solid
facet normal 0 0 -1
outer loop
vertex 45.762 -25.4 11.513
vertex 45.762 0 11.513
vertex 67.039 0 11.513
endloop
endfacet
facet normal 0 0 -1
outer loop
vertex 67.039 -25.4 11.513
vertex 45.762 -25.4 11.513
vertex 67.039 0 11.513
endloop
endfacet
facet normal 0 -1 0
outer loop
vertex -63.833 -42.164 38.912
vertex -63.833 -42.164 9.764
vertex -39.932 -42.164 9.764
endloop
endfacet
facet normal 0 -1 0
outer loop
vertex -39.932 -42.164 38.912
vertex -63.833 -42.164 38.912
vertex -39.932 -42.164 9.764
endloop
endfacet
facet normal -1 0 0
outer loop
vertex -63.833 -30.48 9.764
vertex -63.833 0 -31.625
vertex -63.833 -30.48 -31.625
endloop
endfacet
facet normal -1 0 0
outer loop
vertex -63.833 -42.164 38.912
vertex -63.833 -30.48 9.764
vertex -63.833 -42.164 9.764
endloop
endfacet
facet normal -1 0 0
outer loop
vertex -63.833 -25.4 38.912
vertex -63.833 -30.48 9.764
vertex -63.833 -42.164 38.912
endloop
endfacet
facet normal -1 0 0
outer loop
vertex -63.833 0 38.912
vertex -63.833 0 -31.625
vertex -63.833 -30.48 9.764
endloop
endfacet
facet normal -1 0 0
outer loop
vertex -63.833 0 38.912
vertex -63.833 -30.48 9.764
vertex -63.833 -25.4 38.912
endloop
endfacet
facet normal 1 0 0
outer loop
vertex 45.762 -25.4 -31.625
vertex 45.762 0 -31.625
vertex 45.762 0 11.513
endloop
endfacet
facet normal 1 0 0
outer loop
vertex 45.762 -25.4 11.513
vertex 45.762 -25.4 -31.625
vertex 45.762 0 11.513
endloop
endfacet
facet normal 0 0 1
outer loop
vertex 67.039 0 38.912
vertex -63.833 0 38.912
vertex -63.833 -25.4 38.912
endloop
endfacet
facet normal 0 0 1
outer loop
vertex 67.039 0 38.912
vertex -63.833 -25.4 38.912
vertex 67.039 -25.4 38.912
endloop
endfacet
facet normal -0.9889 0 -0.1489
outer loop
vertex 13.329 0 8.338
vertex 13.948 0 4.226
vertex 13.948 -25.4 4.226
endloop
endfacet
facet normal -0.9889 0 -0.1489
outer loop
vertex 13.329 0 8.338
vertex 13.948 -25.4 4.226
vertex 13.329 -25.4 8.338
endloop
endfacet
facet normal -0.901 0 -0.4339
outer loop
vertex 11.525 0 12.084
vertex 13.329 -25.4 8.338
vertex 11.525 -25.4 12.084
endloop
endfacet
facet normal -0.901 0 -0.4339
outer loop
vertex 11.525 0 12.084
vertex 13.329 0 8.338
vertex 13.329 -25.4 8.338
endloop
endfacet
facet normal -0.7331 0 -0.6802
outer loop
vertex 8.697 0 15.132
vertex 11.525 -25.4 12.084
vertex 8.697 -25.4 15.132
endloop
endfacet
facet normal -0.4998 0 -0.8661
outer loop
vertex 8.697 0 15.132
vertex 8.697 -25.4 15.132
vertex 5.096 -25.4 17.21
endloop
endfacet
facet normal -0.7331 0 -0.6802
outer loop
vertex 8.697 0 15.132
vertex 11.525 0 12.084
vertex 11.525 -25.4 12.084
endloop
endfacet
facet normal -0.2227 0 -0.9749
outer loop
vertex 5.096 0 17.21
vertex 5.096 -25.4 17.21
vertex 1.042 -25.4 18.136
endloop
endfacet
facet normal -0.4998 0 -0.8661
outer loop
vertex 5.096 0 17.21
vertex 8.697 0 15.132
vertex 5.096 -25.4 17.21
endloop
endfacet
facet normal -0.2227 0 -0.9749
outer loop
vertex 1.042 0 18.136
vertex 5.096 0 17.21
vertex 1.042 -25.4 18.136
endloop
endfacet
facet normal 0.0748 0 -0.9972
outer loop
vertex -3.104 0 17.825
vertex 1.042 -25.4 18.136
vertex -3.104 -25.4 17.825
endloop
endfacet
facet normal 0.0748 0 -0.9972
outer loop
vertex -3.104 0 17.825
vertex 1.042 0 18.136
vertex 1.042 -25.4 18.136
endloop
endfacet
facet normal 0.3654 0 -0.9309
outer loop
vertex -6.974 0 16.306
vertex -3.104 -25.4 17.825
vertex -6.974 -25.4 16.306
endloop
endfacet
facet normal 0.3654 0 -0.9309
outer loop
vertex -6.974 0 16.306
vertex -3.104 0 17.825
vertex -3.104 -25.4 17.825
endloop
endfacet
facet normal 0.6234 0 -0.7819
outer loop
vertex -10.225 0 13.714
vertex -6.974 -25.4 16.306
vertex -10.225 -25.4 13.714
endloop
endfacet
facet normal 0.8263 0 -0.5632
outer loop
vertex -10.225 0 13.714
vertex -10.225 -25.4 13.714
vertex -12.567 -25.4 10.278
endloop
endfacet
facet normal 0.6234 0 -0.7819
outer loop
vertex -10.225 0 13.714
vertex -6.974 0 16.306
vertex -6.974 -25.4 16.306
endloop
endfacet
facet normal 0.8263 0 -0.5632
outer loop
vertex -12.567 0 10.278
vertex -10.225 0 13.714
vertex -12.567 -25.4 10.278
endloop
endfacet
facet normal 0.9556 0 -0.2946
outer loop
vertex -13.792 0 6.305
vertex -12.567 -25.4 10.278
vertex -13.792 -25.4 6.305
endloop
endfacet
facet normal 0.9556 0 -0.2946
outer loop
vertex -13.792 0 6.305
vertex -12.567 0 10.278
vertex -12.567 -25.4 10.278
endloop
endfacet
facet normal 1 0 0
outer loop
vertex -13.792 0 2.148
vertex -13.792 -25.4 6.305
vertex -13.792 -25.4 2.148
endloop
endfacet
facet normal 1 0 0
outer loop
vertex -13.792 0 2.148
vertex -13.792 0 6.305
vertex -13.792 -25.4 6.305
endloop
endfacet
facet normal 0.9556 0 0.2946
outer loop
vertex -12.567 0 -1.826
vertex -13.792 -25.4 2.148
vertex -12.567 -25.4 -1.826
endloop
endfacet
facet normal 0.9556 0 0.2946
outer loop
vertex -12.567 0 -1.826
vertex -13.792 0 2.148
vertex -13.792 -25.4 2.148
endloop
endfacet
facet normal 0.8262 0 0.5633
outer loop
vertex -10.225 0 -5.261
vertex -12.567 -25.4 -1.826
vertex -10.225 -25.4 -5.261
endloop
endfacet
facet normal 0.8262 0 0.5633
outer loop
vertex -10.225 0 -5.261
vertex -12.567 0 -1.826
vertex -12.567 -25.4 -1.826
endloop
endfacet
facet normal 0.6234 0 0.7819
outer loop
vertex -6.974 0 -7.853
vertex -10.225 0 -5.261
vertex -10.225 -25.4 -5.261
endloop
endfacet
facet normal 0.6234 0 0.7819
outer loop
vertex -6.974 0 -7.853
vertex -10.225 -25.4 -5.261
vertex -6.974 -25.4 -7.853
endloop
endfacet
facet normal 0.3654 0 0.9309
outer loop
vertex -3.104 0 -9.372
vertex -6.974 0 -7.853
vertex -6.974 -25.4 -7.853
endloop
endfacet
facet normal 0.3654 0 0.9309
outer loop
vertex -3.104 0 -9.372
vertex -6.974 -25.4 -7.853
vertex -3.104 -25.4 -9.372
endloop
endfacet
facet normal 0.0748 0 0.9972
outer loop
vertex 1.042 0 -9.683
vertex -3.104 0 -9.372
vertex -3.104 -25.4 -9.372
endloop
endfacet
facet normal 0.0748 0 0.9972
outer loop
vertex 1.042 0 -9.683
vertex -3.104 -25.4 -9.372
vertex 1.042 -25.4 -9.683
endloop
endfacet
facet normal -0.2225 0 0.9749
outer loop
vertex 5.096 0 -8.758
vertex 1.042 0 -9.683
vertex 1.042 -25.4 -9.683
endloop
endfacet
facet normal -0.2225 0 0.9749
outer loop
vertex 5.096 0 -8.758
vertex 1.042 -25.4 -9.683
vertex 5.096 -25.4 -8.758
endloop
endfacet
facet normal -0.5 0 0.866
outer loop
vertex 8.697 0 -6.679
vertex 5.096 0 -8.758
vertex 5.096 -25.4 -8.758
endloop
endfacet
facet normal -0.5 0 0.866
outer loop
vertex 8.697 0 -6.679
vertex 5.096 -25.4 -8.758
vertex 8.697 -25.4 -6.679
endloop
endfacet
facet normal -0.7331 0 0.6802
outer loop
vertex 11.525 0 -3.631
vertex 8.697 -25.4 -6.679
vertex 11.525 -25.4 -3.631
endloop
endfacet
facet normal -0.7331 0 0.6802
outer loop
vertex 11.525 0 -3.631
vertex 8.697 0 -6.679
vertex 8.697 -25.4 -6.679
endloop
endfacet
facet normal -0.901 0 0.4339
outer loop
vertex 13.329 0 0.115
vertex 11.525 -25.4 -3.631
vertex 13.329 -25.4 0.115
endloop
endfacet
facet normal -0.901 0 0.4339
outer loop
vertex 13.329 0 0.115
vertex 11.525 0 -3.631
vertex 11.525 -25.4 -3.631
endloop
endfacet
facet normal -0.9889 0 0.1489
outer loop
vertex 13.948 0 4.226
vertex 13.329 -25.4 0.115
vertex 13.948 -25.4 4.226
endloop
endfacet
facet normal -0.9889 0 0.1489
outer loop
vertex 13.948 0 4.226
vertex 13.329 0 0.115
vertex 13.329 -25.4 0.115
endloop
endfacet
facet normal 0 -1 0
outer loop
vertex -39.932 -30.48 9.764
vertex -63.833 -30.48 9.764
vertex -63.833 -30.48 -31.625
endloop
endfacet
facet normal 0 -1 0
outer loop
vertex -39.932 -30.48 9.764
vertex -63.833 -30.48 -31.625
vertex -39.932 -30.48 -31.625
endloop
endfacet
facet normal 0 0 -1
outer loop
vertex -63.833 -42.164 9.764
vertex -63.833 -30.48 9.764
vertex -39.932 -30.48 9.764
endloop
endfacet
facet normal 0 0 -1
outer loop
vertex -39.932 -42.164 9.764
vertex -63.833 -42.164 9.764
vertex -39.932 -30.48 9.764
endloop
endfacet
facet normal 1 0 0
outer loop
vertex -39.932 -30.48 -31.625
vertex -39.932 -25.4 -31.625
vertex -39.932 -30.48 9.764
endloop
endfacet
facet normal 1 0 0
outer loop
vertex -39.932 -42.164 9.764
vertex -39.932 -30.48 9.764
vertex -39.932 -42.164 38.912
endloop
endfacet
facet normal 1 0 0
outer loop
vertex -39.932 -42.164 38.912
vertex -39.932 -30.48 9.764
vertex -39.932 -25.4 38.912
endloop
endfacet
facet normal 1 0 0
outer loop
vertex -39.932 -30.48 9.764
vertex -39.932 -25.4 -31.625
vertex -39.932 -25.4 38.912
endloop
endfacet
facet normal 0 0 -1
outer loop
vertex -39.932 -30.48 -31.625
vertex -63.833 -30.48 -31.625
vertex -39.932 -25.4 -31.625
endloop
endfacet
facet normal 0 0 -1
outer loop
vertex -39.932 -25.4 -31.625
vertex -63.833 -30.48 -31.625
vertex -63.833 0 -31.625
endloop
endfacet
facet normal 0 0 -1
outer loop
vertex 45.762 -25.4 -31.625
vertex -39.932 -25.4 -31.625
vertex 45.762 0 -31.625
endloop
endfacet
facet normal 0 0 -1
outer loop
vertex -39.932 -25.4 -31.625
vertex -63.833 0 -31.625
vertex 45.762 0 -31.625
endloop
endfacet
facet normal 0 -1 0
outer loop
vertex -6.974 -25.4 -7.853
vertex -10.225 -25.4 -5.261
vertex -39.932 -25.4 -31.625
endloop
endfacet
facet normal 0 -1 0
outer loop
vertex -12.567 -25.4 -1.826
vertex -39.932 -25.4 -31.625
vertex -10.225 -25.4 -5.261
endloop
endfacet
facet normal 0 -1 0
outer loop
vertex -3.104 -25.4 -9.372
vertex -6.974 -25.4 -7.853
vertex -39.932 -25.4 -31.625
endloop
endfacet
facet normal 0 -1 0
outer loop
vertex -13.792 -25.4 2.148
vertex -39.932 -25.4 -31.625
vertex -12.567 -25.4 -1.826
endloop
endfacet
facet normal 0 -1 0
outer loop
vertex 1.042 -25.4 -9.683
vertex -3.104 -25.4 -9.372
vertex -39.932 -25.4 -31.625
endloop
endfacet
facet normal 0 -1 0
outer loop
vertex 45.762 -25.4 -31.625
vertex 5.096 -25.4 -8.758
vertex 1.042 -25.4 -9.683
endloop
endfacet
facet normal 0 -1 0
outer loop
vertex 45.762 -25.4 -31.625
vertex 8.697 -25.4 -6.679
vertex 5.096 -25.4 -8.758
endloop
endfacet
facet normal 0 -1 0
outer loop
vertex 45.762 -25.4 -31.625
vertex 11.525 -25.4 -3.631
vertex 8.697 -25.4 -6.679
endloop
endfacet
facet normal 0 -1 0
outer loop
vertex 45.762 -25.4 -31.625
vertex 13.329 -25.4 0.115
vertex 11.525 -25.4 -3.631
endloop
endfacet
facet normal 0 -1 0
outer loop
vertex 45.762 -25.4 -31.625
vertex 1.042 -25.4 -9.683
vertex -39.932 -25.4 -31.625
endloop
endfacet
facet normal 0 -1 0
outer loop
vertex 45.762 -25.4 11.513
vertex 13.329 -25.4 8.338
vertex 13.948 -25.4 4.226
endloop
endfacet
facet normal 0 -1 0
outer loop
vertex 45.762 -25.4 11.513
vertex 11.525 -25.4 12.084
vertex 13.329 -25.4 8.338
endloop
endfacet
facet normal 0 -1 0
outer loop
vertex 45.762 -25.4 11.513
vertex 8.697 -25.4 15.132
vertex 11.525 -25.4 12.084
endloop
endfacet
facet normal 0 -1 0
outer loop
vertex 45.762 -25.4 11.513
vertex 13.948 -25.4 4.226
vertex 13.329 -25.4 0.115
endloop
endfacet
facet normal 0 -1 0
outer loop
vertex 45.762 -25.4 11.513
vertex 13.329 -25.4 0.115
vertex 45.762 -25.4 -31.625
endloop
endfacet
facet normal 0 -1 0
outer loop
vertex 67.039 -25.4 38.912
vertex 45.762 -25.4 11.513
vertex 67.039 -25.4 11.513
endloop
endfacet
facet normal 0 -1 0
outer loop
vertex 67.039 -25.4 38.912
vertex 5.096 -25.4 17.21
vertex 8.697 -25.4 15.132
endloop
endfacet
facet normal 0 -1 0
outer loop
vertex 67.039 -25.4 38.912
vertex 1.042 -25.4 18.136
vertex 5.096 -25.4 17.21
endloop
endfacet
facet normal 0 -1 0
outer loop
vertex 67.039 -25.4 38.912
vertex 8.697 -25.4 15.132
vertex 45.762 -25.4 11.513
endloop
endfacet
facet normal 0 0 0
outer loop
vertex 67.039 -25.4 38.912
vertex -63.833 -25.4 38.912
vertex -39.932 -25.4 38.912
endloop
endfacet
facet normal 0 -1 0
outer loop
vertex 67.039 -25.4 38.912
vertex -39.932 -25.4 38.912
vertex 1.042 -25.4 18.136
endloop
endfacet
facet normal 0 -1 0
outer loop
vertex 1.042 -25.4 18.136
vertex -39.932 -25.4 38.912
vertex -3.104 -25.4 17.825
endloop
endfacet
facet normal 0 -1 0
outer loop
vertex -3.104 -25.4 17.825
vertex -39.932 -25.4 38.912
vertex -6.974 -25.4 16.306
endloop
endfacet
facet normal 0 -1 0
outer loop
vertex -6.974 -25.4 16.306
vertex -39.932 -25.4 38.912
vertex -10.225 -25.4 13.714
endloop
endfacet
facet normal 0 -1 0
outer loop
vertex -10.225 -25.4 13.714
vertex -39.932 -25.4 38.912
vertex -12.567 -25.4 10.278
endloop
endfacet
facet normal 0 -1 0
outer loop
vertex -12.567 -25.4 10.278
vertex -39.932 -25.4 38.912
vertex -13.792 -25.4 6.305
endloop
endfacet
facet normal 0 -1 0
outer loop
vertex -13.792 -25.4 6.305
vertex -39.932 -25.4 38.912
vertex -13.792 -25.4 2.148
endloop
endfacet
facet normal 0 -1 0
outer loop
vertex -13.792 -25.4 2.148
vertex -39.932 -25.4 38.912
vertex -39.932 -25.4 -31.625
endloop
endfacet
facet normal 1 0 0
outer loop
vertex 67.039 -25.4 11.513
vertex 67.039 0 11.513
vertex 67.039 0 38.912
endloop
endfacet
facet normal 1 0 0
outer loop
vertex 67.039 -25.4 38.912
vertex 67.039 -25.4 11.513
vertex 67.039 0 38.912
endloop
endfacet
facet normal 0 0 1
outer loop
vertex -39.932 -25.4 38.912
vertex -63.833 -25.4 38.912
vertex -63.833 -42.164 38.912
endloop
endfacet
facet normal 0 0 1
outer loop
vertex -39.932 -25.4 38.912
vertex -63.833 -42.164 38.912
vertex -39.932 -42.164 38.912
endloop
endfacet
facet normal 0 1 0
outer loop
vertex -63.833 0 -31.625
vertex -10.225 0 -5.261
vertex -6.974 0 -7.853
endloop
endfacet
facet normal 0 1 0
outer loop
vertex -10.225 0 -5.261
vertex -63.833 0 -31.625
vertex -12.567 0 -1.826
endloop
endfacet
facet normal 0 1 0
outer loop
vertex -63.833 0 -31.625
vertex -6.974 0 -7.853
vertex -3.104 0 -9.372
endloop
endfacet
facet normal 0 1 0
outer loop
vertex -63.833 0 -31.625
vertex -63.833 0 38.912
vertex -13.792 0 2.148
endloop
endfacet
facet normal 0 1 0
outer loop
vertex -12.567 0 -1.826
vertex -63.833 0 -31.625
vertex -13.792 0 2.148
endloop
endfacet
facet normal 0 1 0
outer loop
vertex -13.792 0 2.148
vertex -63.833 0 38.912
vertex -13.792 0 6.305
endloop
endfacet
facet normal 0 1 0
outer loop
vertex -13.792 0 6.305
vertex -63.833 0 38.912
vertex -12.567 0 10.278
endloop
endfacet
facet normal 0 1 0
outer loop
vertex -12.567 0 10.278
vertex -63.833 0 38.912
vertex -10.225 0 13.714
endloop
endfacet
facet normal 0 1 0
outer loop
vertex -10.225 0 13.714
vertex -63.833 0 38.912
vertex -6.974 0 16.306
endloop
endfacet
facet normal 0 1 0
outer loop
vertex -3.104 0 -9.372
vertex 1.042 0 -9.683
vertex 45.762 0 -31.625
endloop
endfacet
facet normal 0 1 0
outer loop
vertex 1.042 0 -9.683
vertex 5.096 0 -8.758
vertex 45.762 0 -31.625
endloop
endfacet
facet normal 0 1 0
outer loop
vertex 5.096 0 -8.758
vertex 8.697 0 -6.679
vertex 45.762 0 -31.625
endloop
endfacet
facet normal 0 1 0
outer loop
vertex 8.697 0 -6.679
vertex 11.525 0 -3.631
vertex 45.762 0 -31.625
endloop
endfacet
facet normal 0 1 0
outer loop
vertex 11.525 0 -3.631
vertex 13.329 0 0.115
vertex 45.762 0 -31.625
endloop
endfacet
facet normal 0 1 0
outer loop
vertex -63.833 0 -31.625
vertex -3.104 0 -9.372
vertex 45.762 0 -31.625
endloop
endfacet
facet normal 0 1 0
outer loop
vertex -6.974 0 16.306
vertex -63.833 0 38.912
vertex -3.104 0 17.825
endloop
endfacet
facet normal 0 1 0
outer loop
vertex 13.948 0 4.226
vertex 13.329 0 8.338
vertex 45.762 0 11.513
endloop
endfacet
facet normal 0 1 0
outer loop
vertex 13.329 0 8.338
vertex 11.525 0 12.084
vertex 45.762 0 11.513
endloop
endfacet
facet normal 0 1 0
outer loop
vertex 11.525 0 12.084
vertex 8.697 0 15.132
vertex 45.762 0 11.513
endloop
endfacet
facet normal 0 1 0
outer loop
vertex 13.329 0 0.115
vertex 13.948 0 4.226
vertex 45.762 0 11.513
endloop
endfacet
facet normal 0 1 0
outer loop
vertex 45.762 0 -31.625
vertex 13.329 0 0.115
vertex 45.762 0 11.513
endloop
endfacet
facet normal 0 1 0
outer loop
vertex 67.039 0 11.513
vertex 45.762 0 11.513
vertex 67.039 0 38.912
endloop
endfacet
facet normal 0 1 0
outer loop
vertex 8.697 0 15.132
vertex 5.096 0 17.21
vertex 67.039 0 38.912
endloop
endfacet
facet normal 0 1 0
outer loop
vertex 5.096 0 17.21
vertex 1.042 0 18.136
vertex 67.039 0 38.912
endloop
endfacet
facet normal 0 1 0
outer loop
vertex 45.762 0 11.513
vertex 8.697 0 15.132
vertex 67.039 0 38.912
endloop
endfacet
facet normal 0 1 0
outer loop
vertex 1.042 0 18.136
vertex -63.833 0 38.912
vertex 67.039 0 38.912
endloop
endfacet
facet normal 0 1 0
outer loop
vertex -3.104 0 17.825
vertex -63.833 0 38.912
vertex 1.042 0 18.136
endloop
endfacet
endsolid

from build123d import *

# Parameters (mm, degrees)
F0_W     = 130.872465
F0_H     = 70.537049
F0_R     = 13.948248
F1_DEPTH = 25.4
F2_W     = 21.569185
F2_H     = 43.13836
F3_DEPTH = 40.386
F4_W     = 23.900985
F4_H     = 41.389507
F5_DEPTH = 30.48
F6_W     = 23.900985
F6_H     = 29.147542
F7_DEPTH = 42.164


with BuildPart() as f1:
    # F0 (on Front) → F1 (new body)
    with BuildSketch(Plane.XZ):
        with Locations((1.603116, 3.643444)):
            Rectangle(F0_W, F0_H)
        with Locations((0, 4.226394)):
            Circle(F0_R, mode=Mode.SUBTRACT)
    extrude(amount=F1_DEPTH)

    # F2 (on Front) → F3 (cut)
    with BuildSketch(Plane.XZ):
        with Locations((56.546229, -10.055901)):
            Rectangle(F2_W, F2_H)
    extrude(amount=F3_DEPTH, mode=Mode.SUBTRACT)

    # F4 (on Front) → F5 (join)
    with BuildSketch(Plane.XZ):
        with Locations((-51.882624, -10.930327)):
            Rectangle(F4_W, F4_H)
    extrude(amount=F5_DEPTH)

    # F6 (on Front) → F7 (join)
    with BuildSketch(Plane.XZ):
        with Locations((-51.882624, 24.338197)):
            Rectangle(F6_W, F6_H)
    extrude(amount=F7_DEPTH)


solid = f1.part
